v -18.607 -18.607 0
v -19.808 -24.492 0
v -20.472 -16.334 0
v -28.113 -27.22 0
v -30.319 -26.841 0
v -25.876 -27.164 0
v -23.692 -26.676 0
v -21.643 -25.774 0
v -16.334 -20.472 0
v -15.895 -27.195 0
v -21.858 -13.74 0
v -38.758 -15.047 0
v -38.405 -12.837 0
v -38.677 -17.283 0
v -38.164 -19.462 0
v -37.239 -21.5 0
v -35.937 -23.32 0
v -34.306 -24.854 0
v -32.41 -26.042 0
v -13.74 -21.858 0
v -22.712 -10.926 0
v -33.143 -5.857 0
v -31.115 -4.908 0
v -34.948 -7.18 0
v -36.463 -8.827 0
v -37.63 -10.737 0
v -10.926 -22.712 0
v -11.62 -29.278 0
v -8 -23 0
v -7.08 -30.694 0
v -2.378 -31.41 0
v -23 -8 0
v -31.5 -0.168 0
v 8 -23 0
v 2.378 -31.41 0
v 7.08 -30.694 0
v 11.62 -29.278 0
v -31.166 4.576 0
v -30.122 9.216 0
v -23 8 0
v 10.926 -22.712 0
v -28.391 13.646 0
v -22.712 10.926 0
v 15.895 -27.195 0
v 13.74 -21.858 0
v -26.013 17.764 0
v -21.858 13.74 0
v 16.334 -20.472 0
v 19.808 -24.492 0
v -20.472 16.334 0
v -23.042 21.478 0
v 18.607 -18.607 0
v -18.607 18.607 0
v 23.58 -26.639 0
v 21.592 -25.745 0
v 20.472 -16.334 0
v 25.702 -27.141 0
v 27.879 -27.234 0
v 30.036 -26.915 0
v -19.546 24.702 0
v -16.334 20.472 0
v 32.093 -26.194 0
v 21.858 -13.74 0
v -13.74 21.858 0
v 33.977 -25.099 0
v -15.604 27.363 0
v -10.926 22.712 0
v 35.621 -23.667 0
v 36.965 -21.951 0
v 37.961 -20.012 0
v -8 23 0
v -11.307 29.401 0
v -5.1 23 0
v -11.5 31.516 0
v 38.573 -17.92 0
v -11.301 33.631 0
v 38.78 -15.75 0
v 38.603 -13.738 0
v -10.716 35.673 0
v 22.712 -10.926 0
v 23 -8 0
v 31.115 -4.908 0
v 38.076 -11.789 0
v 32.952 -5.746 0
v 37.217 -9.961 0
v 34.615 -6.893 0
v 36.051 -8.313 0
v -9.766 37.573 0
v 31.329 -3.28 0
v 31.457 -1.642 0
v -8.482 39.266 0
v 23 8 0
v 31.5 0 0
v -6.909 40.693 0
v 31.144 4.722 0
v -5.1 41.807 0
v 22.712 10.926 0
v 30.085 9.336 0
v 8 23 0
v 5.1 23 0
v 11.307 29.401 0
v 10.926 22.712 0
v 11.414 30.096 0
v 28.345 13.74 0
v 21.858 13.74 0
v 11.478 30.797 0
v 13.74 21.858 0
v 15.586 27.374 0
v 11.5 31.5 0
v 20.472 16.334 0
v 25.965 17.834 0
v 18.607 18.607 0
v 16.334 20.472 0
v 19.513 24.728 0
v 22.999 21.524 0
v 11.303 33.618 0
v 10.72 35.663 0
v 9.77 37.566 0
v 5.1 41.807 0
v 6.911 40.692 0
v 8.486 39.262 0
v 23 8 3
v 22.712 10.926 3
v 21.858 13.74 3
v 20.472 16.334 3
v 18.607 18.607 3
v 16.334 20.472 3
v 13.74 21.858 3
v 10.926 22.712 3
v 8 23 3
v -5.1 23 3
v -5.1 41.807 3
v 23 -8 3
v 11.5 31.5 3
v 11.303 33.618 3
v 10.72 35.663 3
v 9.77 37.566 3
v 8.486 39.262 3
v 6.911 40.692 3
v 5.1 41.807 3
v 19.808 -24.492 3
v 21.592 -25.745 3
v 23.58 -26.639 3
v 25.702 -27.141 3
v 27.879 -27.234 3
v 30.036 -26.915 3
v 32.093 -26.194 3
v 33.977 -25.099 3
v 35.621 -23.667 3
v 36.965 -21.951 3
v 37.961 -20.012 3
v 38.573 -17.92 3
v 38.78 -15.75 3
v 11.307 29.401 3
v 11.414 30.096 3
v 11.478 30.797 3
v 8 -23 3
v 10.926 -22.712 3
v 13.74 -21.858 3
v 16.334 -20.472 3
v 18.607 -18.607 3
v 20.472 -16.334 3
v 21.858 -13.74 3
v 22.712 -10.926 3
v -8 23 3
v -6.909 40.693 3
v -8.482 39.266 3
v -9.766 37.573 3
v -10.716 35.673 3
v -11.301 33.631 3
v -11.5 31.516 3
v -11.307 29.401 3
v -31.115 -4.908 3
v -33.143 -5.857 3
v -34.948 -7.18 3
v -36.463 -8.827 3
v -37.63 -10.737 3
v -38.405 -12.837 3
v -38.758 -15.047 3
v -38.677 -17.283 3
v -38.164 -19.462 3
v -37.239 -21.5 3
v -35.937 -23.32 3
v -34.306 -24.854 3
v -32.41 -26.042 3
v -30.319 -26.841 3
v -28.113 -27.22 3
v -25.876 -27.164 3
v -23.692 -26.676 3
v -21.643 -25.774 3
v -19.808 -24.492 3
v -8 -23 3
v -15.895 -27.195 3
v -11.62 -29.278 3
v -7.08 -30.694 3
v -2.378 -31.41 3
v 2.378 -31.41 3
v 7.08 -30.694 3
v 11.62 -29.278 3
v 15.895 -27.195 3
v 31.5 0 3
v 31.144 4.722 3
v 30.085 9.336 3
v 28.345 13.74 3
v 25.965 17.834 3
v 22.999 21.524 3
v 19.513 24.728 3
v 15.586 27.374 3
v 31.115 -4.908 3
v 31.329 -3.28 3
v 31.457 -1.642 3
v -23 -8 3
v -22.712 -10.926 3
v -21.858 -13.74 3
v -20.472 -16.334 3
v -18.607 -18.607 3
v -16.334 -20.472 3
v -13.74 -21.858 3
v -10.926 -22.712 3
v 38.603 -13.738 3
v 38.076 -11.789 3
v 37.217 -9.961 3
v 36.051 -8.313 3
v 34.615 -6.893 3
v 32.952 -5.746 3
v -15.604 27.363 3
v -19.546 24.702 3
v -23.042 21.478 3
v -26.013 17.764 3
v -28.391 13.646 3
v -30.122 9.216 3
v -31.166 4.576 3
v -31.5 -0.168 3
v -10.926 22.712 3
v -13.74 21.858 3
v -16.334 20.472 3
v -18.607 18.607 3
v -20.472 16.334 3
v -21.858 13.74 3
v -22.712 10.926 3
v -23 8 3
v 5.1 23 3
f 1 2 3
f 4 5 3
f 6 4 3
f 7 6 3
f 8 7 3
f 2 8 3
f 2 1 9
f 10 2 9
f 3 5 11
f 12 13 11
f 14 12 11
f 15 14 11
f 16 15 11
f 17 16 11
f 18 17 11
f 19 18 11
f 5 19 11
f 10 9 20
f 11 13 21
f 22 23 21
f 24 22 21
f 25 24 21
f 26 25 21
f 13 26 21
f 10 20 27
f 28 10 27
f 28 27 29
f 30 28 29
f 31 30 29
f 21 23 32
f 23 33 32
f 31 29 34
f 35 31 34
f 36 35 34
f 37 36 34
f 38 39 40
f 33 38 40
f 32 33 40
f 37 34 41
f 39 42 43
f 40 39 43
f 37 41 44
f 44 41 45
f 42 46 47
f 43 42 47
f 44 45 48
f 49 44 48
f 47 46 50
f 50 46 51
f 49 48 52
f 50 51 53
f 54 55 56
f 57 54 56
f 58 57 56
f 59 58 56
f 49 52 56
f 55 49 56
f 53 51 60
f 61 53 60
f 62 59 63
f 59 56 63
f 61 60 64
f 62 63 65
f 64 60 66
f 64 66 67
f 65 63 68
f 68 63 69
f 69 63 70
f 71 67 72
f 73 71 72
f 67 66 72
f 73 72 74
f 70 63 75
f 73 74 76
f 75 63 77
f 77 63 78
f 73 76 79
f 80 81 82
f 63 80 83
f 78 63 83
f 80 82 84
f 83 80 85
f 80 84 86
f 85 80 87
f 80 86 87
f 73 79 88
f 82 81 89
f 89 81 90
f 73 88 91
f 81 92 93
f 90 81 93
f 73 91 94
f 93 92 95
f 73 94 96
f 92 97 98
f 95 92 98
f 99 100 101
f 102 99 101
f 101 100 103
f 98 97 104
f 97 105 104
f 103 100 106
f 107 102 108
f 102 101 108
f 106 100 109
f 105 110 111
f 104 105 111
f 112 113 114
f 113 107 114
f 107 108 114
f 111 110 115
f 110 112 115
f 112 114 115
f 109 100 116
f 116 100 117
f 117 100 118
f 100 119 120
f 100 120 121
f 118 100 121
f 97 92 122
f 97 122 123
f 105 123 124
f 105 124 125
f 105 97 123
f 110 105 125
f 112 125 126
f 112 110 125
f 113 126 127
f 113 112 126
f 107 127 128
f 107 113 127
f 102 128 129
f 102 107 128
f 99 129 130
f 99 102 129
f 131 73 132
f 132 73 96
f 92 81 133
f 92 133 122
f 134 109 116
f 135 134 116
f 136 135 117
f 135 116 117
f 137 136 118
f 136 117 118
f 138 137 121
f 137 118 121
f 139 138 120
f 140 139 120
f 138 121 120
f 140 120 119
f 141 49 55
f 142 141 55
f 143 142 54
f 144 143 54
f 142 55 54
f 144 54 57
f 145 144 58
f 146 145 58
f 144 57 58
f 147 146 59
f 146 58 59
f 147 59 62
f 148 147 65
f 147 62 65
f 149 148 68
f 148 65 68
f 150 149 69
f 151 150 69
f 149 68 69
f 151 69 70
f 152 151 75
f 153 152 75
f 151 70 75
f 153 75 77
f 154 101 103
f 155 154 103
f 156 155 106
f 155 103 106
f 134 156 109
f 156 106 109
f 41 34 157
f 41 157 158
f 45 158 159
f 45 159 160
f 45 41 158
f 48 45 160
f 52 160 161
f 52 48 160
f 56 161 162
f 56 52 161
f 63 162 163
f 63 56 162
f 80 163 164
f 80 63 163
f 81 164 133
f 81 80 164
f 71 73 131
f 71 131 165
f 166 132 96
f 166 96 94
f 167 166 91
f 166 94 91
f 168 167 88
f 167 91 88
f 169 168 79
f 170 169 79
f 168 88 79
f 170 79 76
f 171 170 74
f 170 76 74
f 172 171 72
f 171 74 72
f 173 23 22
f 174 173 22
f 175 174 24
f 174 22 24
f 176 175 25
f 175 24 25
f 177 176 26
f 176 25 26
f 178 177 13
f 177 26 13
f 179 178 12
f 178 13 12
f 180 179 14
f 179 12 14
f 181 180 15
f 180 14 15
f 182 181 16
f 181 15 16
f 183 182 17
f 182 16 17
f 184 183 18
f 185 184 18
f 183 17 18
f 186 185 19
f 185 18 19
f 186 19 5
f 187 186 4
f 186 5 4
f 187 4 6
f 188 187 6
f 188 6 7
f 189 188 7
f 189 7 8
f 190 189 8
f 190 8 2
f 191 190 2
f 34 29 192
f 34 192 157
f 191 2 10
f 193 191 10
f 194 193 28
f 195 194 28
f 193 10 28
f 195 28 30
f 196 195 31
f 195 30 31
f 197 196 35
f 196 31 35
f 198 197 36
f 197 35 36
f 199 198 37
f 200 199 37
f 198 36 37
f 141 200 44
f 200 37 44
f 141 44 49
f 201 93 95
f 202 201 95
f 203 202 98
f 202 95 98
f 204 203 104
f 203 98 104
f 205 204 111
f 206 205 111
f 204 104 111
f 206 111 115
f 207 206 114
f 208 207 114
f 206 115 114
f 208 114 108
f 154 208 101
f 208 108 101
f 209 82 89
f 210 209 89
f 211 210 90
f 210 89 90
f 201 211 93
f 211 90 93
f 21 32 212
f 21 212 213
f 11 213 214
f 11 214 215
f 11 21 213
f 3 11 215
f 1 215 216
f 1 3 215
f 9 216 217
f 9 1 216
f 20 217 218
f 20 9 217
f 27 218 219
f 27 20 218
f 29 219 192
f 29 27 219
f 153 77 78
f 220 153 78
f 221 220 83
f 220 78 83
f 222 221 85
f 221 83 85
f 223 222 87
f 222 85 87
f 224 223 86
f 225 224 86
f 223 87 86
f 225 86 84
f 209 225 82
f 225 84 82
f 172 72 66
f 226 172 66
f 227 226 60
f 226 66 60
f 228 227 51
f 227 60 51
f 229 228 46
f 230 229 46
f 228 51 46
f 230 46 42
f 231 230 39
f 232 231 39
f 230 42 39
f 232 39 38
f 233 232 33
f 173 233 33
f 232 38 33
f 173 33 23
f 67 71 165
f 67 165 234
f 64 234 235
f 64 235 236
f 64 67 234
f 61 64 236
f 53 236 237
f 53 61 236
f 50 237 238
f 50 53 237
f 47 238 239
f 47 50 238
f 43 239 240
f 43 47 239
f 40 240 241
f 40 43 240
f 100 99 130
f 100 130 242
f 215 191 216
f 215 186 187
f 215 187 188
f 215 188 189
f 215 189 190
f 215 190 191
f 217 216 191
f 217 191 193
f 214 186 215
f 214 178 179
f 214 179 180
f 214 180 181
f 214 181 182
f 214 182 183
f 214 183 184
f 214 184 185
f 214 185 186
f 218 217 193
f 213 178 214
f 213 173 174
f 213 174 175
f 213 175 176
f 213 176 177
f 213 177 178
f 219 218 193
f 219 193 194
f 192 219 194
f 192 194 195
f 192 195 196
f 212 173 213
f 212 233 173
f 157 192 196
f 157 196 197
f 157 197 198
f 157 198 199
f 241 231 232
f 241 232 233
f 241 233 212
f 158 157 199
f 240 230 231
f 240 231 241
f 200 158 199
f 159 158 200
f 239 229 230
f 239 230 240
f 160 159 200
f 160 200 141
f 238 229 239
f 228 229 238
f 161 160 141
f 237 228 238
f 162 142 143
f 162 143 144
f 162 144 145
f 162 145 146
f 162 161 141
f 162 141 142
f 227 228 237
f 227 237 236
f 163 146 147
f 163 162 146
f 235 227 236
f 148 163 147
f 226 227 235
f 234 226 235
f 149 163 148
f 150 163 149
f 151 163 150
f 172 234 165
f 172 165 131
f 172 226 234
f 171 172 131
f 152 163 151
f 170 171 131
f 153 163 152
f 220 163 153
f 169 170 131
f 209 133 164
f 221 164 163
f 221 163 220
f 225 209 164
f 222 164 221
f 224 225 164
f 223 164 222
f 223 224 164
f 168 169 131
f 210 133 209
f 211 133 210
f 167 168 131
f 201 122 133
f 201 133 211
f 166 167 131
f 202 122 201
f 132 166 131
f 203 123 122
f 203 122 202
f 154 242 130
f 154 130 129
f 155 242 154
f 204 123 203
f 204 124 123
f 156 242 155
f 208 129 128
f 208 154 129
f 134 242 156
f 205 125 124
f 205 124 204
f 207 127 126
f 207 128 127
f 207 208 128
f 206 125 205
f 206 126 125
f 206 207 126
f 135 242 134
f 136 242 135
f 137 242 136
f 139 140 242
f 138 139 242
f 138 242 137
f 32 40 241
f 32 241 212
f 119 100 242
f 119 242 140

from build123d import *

# Parameters (mm, degrees)
F2_DEPTH = 3
F1_W     = 10.2
F1_H     = 6.1991158426
F1_H_2   = 23.2707020342
F3_DEPTH = 3


with BuildPart() as f2:
    # F0 (on Top) → F2 (new body)
    with BuildSketch(Plane.XY):
        with BuildLine():
            ThreePointArc((11.3067825639, 29.4007936636), (11.4515937375, 30.4459601281), (11.4999999642, 31.5))
            ThreePointArc((11.4999999642, 31.5), (-1.0540399207, 42.9515937721), (-11.3067826307, 29.4007936379))
            ThreePointArc((-11.3067826307, 29.4007936379), (-3.58e-08, 31.5), (11.3067825639, 29.4007936636))
        make_face()
        with BuildLine():
            ThreePointArc((11.3067825639, 29.4007936636), (-3.58e-08, 31.5), (-11.3067826307, 29.4007936379))
            ThreePointArc((-11.3067826307, 29.4007936379), (-2.27e-08, 20), (11.3067825639, 29.4007936636))
        make_face()
        with BuildLine():
            ThreePointArc((11.3067825639, 29.4007936636), (-2.27e-08, 20), (-11.3067826307, 29.4007936379))
            ThreePointArc((-11.3067826307, 29.4007936379), (-27.2798002371, 15.749999969), (-31.1152254861, -4.9084358964))
            ThreePointArc((-31.1152254861, -4.9084358964), (-20.641178009, -6.3596488455), (-15.7798002013, -15.750000031))
            ThreePointArc((-15.7798002013, -15.750000031), (-16.8354091384, -20.5629716001), (-19.8084428665, -24.4923578123))
            ThreePointArc((-19.8084428665, -24.4923578123), (3.58e-08, -31.5), (19.8084429222, -24.4923577673))
            ThreePointArc((19.8084429222, -24.4923577673), (17.320508087, -9.9999999803), (31.1152254973, -4.9084358257))
            ThreePointArc((31.1152254973, -4.9084358257), (31.4036590477, -2.4617470256), (31.5, 0))
            ThreePointArc((31.5, 0), (25.965492974, 17.8337650152), (11.3067825639, 29.4007936636))
        make_face()
        with BuildLine():
            ThreePointArc((-19.8084428665, -24.4923578123), (-27.2798002013, -15.750000031), (-31.1152254861, -4.9084358964))
            ThreePointArc((-31.1152254861, -4.9084358964), (-37.2390923383, -21.5000000423), (-19.8084428665, -24.4923578123))
        make_face()
        with BuildLine():
            ThreePointArc((-15.7798002013, -15.750000031), (-20.641178009, -6.3596488455), (-31.1152254861, -4.9084358964))
            ThreePointArc((-31.1152254861, -4.9084358964), (-27.2798002013, -15.750000031), (-19.8084428665, -24.4923578123))
            ThreePointArc((-19.8084428665, -24.4923578123), (-16.8354091384, -20.5629716001), (-15.7798002013, -15.750000031))
        make_face()
        with BuildLine():
            ThreePointArc((19.8084429222, -24.4923577673), (27.2798002371, -15.749999969), (31.1152254973, -4.9084358257))
            ThreePointArc((31.1152254973, -4.9084358257), (17.320508087, -9.9999999803), (19.8084429222, -24.4923577673))
        make_face()
        with BuildLine():
            ThreePointArc((38.7798002371, -15.749999969), (36.6701514151, -9.111377766), (31.1152254973, -4.9084358257))
            ThreePointArc((31.1152254973, -4.9084358257), (27.2798002371, -15.749999969), (19.8084429222, -24.4923577673))
            ThreePointArc((19.8084429222, -24.4923577673), (32.0927718181, -26.1943910265), (38.7798002371, -15.749999969))
        make_face()
    extrude(amount=F2_DEPTH)

    # F1 (on Top) → F3 (cut)
    with BuildSketch(Plane.XY):
        with BuildLine():
            Line((5.1, 23), (5.1, 16.8008841574))
            Line((5.1, 16.8008841574), (-5.1, 16.8008841574))
            Line((-5.1, 16.8008841574), (-5.1, 23))
            Line((-5.1, 23), (-8, 23))
            ThreePointArc((-8, 23), (-18.6066017178, 18.6066017178), (-23, 8))
            Line((-23, 8), (-23, -8))
            ThreePointArc((-23, -8), (-18.6066017178, -18.6066017178), (-8, -23))
            Line((-8, -23), (8, -23))
            ThreePointArc((8, -23), (18.6066017178, -18.6066017178), (23, -8))
            Line((23, -8), (23, 8))
            ThreePointArc((23, 8), (18.6066017178, 18.6066017178), (8, 23))
            Line((8, 23), (5.1, 23))
        make_face()
        with Locations((0, 19.9004420787)):
            Rectangle(F1_W, F1_H)
        with Locations((0, 34.6353510171)):
            Rectangle(F1_W, F1_H_2)
    extrude(amount=F3_DEPTH, mode=Mode.SUBTRACT)


solid = f2.part
